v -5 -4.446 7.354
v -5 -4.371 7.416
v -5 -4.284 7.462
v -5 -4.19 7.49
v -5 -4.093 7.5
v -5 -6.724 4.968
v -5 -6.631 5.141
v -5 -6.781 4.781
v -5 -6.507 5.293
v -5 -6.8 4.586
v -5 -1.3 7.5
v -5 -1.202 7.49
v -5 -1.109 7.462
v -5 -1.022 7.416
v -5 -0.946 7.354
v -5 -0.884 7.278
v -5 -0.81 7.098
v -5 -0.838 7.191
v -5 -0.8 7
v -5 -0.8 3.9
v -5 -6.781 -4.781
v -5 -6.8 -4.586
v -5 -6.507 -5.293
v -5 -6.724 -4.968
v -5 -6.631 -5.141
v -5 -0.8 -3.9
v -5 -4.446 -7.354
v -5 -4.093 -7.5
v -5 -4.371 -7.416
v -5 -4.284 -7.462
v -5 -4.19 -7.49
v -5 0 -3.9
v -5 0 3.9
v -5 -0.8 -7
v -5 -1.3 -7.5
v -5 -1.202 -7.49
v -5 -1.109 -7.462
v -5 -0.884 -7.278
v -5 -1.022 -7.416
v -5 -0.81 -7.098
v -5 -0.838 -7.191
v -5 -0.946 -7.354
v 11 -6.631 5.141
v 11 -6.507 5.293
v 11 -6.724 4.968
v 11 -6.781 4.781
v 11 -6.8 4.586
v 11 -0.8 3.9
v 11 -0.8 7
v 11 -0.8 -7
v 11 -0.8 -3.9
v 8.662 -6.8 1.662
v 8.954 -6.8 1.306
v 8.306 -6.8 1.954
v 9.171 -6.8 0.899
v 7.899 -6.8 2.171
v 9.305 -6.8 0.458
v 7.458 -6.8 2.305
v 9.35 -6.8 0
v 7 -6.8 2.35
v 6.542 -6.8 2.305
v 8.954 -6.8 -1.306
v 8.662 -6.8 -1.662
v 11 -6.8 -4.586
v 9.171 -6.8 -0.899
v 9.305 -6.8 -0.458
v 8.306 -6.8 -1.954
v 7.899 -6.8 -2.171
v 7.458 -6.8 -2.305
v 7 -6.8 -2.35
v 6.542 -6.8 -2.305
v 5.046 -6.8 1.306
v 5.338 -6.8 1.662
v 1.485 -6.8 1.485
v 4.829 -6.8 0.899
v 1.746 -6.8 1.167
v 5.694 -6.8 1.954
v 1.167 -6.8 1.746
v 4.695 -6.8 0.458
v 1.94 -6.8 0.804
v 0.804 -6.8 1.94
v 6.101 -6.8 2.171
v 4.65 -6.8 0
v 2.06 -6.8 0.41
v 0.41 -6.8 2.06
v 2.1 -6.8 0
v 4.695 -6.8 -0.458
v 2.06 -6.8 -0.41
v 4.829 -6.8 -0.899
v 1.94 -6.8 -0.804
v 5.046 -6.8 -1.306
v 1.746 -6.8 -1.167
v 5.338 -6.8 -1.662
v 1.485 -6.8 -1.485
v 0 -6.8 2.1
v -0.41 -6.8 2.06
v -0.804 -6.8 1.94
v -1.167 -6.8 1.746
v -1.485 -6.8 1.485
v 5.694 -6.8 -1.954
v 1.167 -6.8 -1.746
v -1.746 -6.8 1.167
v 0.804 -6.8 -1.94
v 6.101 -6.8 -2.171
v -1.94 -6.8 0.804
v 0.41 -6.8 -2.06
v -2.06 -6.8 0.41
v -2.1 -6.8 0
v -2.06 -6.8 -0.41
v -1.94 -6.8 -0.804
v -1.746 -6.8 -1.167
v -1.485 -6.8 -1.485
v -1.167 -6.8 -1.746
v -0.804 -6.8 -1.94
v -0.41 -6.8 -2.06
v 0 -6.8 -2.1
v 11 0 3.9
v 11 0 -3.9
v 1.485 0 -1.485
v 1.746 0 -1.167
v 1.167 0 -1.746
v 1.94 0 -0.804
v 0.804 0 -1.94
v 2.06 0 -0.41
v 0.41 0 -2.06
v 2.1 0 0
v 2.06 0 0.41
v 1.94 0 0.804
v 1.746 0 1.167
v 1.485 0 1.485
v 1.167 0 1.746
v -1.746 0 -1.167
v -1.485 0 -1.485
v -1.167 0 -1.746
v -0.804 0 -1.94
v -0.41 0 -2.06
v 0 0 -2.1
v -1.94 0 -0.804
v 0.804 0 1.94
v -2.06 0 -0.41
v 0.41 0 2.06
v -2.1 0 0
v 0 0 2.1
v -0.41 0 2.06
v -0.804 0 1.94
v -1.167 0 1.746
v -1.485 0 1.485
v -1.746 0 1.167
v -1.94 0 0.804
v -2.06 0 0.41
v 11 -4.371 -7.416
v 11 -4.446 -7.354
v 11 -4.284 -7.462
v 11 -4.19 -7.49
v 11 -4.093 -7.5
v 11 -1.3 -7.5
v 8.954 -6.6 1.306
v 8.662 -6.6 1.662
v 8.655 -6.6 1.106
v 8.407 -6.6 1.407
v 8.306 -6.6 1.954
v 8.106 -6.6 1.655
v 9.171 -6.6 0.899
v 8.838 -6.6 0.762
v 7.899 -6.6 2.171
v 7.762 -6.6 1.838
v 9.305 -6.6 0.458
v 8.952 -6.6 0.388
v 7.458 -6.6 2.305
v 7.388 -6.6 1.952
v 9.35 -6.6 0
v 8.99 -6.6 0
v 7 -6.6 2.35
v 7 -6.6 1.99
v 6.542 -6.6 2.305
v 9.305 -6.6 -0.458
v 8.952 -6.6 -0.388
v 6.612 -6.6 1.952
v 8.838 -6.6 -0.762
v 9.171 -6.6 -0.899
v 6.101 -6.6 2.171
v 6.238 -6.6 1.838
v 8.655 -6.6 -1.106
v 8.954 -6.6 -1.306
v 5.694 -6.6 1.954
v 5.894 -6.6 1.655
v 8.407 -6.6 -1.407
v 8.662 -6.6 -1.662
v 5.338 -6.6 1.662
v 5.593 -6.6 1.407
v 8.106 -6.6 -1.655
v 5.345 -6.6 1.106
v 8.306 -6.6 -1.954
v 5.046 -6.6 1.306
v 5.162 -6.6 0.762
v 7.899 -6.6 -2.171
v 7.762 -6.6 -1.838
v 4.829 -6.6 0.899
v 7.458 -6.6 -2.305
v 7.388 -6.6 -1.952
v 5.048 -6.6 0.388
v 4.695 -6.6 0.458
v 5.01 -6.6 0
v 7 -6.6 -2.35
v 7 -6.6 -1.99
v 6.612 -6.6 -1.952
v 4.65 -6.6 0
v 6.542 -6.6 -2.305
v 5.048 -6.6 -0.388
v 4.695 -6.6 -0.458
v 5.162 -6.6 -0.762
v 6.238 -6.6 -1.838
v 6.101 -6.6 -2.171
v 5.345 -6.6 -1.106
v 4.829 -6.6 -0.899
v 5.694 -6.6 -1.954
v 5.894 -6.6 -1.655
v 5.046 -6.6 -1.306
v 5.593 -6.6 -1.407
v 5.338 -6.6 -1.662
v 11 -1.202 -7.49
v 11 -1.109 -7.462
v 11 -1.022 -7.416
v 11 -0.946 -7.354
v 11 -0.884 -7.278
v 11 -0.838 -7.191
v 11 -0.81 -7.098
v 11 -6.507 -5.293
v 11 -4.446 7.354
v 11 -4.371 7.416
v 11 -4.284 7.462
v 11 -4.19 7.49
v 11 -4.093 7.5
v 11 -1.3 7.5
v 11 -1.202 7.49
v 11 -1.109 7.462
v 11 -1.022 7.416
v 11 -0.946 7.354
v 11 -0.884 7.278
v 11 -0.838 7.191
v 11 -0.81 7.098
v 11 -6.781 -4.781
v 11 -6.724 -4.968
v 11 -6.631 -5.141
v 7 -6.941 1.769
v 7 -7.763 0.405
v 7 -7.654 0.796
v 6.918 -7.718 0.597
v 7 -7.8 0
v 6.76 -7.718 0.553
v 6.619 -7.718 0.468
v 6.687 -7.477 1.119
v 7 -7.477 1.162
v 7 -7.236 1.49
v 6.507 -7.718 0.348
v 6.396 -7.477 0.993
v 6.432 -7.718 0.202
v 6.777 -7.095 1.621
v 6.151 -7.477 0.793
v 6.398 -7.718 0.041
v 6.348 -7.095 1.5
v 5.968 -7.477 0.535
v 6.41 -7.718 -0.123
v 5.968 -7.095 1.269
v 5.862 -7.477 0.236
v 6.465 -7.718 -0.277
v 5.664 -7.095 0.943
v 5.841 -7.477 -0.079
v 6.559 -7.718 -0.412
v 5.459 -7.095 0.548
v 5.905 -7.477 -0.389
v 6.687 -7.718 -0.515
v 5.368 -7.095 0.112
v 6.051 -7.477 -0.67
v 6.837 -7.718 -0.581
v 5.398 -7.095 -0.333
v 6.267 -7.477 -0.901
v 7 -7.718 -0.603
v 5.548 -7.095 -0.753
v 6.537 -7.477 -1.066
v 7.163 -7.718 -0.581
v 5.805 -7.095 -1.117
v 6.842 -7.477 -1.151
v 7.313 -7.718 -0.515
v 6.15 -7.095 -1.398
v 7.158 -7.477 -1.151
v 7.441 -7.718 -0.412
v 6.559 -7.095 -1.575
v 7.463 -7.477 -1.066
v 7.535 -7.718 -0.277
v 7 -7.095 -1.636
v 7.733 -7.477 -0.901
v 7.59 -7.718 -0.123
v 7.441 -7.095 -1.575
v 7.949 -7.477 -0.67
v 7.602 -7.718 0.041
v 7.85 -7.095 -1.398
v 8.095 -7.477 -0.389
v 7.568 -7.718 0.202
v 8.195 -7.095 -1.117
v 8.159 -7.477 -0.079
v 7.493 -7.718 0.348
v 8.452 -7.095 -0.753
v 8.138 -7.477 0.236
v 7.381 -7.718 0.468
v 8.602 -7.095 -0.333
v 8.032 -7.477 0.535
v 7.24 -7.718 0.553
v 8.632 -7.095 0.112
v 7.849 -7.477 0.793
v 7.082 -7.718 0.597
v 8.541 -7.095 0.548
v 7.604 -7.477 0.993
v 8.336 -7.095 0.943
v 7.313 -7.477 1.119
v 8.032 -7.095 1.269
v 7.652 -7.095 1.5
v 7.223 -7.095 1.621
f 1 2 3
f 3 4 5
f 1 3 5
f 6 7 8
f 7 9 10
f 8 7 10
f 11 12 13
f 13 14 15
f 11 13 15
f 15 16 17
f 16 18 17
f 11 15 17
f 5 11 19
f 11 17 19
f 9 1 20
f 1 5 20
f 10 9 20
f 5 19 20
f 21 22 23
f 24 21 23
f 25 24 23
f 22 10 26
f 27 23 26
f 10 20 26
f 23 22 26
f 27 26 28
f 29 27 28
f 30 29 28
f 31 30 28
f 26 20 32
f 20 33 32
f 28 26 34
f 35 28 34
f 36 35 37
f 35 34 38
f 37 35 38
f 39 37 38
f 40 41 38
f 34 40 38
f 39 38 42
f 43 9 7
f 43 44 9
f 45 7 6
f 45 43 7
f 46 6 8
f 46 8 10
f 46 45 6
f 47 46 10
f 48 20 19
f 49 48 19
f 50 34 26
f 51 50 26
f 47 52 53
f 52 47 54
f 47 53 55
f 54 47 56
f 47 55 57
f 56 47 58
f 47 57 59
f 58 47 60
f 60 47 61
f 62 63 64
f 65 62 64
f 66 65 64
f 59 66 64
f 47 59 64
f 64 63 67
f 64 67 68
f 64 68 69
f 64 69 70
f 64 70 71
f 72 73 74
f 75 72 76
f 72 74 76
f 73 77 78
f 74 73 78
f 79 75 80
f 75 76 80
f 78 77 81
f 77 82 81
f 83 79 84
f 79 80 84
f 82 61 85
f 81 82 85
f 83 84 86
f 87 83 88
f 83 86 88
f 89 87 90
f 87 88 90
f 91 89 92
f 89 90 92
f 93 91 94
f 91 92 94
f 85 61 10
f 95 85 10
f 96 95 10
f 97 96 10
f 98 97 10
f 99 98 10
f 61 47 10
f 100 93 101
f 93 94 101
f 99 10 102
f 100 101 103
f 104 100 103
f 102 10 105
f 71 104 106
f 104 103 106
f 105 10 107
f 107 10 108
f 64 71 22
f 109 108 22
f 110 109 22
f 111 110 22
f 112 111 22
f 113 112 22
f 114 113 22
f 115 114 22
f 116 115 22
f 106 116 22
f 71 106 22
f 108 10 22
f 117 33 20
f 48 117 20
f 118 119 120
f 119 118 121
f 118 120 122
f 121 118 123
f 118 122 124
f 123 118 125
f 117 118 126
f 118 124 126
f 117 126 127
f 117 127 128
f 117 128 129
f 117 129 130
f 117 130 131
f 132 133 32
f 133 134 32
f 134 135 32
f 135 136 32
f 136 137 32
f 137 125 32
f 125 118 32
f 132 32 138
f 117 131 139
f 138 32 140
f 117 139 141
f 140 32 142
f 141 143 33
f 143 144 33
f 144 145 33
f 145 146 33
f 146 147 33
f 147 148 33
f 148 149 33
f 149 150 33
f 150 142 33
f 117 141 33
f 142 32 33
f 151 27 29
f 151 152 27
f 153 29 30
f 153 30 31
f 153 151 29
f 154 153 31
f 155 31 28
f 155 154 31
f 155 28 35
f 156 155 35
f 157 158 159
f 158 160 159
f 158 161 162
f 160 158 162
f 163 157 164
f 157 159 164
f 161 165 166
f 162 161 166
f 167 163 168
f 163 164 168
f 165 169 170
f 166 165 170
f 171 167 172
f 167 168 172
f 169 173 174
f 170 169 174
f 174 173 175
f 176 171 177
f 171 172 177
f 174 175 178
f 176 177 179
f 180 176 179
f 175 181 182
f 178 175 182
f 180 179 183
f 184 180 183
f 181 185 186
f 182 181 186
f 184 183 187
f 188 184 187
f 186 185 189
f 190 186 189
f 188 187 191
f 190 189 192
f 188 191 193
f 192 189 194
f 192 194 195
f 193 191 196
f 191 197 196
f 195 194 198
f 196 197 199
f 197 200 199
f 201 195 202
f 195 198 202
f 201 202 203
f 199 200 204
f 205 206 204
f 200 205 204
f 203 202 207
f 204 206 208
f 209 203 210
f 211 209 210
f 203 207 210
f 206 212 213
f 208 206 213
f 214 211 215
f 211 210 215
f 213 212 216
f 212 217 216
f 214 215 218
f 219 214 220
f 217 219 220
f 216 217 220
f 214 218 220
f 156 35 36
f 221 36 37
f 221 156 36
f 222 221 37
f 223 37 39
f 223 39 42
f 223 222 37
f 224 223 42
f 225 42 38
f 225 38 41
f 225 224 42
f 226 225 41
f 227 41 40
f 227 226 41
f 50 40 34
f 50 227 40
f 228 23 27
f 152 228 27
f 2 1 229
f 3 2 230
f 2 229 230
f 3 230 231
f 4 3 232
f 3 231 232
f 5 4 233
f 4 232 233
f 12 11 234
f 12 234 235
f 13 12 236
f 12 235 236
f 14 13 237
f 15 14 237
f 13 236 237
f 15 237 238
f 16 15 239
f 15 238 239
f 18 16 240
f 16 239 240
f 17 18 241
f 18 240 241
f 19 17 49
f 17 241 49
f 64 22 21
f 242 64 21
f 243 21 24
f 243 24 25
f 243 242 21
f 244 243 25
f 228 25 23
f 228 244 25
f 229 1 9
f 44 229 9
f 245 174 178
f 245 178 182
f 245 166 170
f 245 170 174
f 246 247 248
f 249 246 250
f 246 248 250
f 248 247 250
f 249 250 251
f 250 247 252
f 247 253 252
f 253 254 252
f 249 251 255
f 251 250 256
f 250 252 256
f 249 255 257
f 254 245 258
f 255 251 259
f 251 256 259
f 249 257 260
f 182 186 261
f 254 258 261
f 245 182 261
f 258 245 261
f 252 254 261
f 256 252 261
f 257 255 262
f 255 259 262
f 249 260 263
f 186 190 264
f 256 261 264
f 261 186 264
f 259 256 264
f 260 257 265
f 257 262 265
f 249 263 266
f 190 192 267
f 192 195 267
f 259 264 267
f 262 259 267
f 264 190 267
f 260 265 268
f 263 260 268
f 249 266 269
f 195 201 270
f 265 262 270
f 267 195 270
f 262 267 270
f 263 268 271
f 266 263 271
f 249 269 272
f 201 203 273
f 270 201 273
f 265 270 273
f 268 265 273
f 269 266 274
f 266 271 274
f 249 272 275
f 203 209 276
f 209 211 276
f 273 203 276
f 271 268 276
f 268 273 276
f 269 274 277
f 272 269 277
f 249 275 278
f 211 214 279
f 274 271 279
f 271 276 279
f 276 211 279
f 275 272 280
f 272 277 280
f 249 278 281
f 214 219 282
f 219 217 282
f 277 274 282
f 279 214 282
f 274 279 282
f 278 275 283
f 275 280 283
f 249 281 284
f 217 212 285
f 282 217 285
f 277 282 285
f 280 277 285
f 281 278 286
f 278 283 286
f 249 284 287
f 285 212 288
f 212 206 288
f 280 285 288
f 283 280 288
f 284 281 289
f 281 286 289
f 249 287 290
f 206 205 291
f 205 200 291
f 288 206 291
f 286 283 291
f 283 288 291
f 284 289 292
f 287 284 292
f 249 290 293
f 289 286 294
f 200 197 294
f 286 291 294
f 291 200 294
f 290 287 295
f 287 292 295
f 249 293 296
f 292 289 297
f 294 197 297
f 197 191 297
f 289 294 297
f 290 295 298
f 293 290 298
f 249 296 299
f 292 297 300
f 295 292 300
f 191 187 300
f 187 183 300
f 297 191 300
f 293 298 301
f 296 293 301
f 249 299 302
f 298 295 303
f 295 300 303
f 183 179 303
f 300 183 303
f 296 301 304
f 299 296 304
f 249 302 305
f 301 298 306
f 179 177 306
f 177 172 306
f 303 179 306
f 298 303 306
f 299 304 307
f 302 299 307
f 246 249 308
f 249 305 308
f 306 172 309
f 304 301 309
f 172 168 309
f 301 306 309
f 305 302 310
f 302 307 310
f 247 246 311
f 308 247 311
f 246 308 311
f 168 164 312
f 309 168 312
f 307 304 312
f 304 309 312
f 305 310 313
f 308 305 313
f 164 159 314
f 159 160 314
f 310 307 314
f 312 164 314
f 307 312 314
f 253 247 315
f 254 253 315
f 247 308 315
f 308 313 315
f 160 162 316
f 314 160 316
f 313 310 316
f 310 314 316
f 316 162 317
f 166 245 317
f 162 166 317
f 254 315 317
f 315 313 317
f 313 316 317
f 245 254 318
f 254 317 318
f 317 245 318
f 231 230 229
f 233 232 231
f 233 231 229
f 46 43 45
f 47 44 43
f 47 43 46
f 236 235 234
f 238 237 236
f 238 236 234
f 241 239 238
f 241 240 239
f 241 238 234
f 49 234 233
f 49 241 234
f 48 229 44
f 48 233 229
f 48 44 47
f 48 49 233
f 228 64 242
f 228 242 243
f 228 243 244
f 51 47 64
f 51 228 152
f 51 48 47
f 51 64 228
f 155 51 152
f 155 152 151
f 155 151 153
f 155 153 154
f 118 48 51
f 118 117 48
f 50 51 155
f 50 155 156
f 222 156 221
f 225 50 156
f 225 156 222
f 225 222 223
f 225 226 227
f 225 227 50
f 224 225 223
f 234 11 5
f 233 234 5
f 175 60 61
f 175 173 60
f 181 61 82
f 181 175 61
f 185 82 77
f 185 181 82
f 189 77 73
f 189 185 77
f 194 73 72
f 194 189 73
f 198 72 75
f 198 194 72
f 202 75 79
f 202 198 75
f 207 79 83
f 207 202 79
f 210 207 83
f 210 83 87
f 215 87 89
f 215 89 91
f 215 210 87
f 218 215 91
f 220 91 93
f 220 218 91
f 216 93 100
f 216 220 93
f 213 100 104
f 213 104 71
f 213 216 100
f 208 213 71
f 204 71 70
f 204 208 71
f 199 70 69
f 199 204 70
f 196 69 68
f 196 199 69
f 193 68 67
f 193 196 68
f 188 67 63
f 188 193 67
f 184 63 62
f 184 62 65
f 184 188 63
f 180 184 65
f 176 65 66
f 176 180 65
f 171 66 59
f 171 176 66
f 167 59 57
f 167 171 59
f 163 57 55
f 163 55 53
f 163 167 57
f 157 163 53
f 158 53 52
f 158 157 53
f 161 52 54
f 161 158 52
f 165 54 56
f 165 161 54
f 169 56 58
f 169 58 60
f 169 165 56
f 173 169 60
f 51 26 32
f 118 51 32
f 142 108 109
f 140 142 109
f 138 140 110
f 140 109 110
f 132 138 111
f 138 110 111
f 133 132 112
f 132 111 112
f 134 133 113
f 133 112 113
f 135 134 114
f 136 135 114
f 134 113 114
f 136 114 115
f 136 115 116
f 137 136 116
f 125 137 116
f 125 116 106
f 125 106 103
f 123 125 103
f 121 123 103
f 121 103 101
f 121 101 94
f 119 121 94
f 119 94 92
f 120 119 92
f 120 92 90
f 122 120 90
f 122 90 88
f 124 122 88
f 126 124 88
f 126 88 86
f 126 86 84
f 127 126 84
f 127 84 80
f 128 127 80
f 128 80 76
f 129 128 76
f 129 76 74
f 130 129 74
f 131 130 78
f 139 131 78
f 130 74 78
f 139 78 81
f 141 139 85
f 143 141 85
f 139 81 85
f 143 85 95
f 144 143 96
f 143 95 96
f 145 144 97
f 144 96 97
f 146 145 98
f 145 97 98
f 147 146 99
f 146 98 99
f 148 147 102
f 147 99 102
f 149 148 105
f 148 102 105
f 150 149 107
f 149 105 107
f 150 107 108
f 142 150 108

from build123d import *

# Parameters (mm, degrees)
BOSS_EXTRUDE1_DEPTH = 16
FILLET1_R           = 1
FILLET2_R           = 0.5
SKETCH2_W           = 2.35
SKETCH2_H           = 0.2
TAPPED_HOLE1_D      = 4.2


with BuildPart() as part:
    # Sketch1 → Boss-Extrude1 (new body)
    with BuildSketch(Plane(origin=(-5, 0, 0), x_dir=(0, 0, -1), z_dir=(1, 0, 0))):
        Polygon((3.9, 0), (-3.9, 0), (-3.9, -0.8), (-7.5, -0.8), (-7.5, -4.3), (-5, -6.8), (5, -6.8), (7.5, -4.3), (7.5, -0.8), (3.9, -0.8), align=None)
    extrude(amount=BOSS_EXTRUDE1_DEPTH)

    # Fillet1
    fillet1_edges = [part.edges().sort_by_distance(p)[0] for p in [
        (3, -6.8, -5),
        (3, -6.8, 5),
    ]]
    fillet(fillet1_edges, radius=FILLET1_R)

    # Fillet2
    fillet2_edges = [part.edges().sort_by_distance(p)[0] for p in [
        (3, -0.8, 7.5),
        (3, -0.8, -7.5),
        (3, -4.3, -7.5),
        (3, -4.3, 7.5),
    ]]
    fillet(fillet2_edges, radius=FILLET2_R)

    # Sketch2 → Cut-Revolve1 (revolve, cut)
    with BuildSketch(Plane(origin=(7, 0, 0), x_dir=(0, 0, -1), z_dir=(1, 0, 0)), mode=Mode.PRIVATE) as cut_revolve1_sk:
        with Locations((1.175, -6.7)):
            Rectangle(SKETCH2_W, SKETCH2_H)
    revolve(cut_revolve1_sk.sketch.rotate(Axis((7, 1.665548573, 0), (0, -1, 0)), 180), axis=Axis((7, 1.665548573, 0), (0, -1, 0)), mode=Mode.SUBTRACT)

    # Sketch3 → Revolve1 (revolve)
    with BuildSketch(Plane(origin=(7, 0, 0), x_dir=(0, 0, -1), z_dir=(1, 0, 0)), mode=Mode.PRIVATE) as revolve1_sk:
        with BuildLine():
            Line((1.989974874, -6.6), (0, -6.6))
            Line((0, -6.6), (0, -7.8))
            ThreePointArc((0, -7.8), (1.161895004, -7.476784887), (1.989974874, -6.6))
        make_face()
    revolve(revolve1_sk.sketch.rotate(Axis((7, 0, 0), (0, -1, 0)), 180), axis=Axis((7, 0, 0), (0, -1, 0)))

    # Tapped Hole1 (through all)
    with Locations(Plane(origin=(0, 0, 0), x_dir=(1, 0, 0), z_dir=(0, 1, 0))):
        with Locations((0, 0)):
            Hole(TAPPED_HOLE1_D / 2)


solid = part.part
